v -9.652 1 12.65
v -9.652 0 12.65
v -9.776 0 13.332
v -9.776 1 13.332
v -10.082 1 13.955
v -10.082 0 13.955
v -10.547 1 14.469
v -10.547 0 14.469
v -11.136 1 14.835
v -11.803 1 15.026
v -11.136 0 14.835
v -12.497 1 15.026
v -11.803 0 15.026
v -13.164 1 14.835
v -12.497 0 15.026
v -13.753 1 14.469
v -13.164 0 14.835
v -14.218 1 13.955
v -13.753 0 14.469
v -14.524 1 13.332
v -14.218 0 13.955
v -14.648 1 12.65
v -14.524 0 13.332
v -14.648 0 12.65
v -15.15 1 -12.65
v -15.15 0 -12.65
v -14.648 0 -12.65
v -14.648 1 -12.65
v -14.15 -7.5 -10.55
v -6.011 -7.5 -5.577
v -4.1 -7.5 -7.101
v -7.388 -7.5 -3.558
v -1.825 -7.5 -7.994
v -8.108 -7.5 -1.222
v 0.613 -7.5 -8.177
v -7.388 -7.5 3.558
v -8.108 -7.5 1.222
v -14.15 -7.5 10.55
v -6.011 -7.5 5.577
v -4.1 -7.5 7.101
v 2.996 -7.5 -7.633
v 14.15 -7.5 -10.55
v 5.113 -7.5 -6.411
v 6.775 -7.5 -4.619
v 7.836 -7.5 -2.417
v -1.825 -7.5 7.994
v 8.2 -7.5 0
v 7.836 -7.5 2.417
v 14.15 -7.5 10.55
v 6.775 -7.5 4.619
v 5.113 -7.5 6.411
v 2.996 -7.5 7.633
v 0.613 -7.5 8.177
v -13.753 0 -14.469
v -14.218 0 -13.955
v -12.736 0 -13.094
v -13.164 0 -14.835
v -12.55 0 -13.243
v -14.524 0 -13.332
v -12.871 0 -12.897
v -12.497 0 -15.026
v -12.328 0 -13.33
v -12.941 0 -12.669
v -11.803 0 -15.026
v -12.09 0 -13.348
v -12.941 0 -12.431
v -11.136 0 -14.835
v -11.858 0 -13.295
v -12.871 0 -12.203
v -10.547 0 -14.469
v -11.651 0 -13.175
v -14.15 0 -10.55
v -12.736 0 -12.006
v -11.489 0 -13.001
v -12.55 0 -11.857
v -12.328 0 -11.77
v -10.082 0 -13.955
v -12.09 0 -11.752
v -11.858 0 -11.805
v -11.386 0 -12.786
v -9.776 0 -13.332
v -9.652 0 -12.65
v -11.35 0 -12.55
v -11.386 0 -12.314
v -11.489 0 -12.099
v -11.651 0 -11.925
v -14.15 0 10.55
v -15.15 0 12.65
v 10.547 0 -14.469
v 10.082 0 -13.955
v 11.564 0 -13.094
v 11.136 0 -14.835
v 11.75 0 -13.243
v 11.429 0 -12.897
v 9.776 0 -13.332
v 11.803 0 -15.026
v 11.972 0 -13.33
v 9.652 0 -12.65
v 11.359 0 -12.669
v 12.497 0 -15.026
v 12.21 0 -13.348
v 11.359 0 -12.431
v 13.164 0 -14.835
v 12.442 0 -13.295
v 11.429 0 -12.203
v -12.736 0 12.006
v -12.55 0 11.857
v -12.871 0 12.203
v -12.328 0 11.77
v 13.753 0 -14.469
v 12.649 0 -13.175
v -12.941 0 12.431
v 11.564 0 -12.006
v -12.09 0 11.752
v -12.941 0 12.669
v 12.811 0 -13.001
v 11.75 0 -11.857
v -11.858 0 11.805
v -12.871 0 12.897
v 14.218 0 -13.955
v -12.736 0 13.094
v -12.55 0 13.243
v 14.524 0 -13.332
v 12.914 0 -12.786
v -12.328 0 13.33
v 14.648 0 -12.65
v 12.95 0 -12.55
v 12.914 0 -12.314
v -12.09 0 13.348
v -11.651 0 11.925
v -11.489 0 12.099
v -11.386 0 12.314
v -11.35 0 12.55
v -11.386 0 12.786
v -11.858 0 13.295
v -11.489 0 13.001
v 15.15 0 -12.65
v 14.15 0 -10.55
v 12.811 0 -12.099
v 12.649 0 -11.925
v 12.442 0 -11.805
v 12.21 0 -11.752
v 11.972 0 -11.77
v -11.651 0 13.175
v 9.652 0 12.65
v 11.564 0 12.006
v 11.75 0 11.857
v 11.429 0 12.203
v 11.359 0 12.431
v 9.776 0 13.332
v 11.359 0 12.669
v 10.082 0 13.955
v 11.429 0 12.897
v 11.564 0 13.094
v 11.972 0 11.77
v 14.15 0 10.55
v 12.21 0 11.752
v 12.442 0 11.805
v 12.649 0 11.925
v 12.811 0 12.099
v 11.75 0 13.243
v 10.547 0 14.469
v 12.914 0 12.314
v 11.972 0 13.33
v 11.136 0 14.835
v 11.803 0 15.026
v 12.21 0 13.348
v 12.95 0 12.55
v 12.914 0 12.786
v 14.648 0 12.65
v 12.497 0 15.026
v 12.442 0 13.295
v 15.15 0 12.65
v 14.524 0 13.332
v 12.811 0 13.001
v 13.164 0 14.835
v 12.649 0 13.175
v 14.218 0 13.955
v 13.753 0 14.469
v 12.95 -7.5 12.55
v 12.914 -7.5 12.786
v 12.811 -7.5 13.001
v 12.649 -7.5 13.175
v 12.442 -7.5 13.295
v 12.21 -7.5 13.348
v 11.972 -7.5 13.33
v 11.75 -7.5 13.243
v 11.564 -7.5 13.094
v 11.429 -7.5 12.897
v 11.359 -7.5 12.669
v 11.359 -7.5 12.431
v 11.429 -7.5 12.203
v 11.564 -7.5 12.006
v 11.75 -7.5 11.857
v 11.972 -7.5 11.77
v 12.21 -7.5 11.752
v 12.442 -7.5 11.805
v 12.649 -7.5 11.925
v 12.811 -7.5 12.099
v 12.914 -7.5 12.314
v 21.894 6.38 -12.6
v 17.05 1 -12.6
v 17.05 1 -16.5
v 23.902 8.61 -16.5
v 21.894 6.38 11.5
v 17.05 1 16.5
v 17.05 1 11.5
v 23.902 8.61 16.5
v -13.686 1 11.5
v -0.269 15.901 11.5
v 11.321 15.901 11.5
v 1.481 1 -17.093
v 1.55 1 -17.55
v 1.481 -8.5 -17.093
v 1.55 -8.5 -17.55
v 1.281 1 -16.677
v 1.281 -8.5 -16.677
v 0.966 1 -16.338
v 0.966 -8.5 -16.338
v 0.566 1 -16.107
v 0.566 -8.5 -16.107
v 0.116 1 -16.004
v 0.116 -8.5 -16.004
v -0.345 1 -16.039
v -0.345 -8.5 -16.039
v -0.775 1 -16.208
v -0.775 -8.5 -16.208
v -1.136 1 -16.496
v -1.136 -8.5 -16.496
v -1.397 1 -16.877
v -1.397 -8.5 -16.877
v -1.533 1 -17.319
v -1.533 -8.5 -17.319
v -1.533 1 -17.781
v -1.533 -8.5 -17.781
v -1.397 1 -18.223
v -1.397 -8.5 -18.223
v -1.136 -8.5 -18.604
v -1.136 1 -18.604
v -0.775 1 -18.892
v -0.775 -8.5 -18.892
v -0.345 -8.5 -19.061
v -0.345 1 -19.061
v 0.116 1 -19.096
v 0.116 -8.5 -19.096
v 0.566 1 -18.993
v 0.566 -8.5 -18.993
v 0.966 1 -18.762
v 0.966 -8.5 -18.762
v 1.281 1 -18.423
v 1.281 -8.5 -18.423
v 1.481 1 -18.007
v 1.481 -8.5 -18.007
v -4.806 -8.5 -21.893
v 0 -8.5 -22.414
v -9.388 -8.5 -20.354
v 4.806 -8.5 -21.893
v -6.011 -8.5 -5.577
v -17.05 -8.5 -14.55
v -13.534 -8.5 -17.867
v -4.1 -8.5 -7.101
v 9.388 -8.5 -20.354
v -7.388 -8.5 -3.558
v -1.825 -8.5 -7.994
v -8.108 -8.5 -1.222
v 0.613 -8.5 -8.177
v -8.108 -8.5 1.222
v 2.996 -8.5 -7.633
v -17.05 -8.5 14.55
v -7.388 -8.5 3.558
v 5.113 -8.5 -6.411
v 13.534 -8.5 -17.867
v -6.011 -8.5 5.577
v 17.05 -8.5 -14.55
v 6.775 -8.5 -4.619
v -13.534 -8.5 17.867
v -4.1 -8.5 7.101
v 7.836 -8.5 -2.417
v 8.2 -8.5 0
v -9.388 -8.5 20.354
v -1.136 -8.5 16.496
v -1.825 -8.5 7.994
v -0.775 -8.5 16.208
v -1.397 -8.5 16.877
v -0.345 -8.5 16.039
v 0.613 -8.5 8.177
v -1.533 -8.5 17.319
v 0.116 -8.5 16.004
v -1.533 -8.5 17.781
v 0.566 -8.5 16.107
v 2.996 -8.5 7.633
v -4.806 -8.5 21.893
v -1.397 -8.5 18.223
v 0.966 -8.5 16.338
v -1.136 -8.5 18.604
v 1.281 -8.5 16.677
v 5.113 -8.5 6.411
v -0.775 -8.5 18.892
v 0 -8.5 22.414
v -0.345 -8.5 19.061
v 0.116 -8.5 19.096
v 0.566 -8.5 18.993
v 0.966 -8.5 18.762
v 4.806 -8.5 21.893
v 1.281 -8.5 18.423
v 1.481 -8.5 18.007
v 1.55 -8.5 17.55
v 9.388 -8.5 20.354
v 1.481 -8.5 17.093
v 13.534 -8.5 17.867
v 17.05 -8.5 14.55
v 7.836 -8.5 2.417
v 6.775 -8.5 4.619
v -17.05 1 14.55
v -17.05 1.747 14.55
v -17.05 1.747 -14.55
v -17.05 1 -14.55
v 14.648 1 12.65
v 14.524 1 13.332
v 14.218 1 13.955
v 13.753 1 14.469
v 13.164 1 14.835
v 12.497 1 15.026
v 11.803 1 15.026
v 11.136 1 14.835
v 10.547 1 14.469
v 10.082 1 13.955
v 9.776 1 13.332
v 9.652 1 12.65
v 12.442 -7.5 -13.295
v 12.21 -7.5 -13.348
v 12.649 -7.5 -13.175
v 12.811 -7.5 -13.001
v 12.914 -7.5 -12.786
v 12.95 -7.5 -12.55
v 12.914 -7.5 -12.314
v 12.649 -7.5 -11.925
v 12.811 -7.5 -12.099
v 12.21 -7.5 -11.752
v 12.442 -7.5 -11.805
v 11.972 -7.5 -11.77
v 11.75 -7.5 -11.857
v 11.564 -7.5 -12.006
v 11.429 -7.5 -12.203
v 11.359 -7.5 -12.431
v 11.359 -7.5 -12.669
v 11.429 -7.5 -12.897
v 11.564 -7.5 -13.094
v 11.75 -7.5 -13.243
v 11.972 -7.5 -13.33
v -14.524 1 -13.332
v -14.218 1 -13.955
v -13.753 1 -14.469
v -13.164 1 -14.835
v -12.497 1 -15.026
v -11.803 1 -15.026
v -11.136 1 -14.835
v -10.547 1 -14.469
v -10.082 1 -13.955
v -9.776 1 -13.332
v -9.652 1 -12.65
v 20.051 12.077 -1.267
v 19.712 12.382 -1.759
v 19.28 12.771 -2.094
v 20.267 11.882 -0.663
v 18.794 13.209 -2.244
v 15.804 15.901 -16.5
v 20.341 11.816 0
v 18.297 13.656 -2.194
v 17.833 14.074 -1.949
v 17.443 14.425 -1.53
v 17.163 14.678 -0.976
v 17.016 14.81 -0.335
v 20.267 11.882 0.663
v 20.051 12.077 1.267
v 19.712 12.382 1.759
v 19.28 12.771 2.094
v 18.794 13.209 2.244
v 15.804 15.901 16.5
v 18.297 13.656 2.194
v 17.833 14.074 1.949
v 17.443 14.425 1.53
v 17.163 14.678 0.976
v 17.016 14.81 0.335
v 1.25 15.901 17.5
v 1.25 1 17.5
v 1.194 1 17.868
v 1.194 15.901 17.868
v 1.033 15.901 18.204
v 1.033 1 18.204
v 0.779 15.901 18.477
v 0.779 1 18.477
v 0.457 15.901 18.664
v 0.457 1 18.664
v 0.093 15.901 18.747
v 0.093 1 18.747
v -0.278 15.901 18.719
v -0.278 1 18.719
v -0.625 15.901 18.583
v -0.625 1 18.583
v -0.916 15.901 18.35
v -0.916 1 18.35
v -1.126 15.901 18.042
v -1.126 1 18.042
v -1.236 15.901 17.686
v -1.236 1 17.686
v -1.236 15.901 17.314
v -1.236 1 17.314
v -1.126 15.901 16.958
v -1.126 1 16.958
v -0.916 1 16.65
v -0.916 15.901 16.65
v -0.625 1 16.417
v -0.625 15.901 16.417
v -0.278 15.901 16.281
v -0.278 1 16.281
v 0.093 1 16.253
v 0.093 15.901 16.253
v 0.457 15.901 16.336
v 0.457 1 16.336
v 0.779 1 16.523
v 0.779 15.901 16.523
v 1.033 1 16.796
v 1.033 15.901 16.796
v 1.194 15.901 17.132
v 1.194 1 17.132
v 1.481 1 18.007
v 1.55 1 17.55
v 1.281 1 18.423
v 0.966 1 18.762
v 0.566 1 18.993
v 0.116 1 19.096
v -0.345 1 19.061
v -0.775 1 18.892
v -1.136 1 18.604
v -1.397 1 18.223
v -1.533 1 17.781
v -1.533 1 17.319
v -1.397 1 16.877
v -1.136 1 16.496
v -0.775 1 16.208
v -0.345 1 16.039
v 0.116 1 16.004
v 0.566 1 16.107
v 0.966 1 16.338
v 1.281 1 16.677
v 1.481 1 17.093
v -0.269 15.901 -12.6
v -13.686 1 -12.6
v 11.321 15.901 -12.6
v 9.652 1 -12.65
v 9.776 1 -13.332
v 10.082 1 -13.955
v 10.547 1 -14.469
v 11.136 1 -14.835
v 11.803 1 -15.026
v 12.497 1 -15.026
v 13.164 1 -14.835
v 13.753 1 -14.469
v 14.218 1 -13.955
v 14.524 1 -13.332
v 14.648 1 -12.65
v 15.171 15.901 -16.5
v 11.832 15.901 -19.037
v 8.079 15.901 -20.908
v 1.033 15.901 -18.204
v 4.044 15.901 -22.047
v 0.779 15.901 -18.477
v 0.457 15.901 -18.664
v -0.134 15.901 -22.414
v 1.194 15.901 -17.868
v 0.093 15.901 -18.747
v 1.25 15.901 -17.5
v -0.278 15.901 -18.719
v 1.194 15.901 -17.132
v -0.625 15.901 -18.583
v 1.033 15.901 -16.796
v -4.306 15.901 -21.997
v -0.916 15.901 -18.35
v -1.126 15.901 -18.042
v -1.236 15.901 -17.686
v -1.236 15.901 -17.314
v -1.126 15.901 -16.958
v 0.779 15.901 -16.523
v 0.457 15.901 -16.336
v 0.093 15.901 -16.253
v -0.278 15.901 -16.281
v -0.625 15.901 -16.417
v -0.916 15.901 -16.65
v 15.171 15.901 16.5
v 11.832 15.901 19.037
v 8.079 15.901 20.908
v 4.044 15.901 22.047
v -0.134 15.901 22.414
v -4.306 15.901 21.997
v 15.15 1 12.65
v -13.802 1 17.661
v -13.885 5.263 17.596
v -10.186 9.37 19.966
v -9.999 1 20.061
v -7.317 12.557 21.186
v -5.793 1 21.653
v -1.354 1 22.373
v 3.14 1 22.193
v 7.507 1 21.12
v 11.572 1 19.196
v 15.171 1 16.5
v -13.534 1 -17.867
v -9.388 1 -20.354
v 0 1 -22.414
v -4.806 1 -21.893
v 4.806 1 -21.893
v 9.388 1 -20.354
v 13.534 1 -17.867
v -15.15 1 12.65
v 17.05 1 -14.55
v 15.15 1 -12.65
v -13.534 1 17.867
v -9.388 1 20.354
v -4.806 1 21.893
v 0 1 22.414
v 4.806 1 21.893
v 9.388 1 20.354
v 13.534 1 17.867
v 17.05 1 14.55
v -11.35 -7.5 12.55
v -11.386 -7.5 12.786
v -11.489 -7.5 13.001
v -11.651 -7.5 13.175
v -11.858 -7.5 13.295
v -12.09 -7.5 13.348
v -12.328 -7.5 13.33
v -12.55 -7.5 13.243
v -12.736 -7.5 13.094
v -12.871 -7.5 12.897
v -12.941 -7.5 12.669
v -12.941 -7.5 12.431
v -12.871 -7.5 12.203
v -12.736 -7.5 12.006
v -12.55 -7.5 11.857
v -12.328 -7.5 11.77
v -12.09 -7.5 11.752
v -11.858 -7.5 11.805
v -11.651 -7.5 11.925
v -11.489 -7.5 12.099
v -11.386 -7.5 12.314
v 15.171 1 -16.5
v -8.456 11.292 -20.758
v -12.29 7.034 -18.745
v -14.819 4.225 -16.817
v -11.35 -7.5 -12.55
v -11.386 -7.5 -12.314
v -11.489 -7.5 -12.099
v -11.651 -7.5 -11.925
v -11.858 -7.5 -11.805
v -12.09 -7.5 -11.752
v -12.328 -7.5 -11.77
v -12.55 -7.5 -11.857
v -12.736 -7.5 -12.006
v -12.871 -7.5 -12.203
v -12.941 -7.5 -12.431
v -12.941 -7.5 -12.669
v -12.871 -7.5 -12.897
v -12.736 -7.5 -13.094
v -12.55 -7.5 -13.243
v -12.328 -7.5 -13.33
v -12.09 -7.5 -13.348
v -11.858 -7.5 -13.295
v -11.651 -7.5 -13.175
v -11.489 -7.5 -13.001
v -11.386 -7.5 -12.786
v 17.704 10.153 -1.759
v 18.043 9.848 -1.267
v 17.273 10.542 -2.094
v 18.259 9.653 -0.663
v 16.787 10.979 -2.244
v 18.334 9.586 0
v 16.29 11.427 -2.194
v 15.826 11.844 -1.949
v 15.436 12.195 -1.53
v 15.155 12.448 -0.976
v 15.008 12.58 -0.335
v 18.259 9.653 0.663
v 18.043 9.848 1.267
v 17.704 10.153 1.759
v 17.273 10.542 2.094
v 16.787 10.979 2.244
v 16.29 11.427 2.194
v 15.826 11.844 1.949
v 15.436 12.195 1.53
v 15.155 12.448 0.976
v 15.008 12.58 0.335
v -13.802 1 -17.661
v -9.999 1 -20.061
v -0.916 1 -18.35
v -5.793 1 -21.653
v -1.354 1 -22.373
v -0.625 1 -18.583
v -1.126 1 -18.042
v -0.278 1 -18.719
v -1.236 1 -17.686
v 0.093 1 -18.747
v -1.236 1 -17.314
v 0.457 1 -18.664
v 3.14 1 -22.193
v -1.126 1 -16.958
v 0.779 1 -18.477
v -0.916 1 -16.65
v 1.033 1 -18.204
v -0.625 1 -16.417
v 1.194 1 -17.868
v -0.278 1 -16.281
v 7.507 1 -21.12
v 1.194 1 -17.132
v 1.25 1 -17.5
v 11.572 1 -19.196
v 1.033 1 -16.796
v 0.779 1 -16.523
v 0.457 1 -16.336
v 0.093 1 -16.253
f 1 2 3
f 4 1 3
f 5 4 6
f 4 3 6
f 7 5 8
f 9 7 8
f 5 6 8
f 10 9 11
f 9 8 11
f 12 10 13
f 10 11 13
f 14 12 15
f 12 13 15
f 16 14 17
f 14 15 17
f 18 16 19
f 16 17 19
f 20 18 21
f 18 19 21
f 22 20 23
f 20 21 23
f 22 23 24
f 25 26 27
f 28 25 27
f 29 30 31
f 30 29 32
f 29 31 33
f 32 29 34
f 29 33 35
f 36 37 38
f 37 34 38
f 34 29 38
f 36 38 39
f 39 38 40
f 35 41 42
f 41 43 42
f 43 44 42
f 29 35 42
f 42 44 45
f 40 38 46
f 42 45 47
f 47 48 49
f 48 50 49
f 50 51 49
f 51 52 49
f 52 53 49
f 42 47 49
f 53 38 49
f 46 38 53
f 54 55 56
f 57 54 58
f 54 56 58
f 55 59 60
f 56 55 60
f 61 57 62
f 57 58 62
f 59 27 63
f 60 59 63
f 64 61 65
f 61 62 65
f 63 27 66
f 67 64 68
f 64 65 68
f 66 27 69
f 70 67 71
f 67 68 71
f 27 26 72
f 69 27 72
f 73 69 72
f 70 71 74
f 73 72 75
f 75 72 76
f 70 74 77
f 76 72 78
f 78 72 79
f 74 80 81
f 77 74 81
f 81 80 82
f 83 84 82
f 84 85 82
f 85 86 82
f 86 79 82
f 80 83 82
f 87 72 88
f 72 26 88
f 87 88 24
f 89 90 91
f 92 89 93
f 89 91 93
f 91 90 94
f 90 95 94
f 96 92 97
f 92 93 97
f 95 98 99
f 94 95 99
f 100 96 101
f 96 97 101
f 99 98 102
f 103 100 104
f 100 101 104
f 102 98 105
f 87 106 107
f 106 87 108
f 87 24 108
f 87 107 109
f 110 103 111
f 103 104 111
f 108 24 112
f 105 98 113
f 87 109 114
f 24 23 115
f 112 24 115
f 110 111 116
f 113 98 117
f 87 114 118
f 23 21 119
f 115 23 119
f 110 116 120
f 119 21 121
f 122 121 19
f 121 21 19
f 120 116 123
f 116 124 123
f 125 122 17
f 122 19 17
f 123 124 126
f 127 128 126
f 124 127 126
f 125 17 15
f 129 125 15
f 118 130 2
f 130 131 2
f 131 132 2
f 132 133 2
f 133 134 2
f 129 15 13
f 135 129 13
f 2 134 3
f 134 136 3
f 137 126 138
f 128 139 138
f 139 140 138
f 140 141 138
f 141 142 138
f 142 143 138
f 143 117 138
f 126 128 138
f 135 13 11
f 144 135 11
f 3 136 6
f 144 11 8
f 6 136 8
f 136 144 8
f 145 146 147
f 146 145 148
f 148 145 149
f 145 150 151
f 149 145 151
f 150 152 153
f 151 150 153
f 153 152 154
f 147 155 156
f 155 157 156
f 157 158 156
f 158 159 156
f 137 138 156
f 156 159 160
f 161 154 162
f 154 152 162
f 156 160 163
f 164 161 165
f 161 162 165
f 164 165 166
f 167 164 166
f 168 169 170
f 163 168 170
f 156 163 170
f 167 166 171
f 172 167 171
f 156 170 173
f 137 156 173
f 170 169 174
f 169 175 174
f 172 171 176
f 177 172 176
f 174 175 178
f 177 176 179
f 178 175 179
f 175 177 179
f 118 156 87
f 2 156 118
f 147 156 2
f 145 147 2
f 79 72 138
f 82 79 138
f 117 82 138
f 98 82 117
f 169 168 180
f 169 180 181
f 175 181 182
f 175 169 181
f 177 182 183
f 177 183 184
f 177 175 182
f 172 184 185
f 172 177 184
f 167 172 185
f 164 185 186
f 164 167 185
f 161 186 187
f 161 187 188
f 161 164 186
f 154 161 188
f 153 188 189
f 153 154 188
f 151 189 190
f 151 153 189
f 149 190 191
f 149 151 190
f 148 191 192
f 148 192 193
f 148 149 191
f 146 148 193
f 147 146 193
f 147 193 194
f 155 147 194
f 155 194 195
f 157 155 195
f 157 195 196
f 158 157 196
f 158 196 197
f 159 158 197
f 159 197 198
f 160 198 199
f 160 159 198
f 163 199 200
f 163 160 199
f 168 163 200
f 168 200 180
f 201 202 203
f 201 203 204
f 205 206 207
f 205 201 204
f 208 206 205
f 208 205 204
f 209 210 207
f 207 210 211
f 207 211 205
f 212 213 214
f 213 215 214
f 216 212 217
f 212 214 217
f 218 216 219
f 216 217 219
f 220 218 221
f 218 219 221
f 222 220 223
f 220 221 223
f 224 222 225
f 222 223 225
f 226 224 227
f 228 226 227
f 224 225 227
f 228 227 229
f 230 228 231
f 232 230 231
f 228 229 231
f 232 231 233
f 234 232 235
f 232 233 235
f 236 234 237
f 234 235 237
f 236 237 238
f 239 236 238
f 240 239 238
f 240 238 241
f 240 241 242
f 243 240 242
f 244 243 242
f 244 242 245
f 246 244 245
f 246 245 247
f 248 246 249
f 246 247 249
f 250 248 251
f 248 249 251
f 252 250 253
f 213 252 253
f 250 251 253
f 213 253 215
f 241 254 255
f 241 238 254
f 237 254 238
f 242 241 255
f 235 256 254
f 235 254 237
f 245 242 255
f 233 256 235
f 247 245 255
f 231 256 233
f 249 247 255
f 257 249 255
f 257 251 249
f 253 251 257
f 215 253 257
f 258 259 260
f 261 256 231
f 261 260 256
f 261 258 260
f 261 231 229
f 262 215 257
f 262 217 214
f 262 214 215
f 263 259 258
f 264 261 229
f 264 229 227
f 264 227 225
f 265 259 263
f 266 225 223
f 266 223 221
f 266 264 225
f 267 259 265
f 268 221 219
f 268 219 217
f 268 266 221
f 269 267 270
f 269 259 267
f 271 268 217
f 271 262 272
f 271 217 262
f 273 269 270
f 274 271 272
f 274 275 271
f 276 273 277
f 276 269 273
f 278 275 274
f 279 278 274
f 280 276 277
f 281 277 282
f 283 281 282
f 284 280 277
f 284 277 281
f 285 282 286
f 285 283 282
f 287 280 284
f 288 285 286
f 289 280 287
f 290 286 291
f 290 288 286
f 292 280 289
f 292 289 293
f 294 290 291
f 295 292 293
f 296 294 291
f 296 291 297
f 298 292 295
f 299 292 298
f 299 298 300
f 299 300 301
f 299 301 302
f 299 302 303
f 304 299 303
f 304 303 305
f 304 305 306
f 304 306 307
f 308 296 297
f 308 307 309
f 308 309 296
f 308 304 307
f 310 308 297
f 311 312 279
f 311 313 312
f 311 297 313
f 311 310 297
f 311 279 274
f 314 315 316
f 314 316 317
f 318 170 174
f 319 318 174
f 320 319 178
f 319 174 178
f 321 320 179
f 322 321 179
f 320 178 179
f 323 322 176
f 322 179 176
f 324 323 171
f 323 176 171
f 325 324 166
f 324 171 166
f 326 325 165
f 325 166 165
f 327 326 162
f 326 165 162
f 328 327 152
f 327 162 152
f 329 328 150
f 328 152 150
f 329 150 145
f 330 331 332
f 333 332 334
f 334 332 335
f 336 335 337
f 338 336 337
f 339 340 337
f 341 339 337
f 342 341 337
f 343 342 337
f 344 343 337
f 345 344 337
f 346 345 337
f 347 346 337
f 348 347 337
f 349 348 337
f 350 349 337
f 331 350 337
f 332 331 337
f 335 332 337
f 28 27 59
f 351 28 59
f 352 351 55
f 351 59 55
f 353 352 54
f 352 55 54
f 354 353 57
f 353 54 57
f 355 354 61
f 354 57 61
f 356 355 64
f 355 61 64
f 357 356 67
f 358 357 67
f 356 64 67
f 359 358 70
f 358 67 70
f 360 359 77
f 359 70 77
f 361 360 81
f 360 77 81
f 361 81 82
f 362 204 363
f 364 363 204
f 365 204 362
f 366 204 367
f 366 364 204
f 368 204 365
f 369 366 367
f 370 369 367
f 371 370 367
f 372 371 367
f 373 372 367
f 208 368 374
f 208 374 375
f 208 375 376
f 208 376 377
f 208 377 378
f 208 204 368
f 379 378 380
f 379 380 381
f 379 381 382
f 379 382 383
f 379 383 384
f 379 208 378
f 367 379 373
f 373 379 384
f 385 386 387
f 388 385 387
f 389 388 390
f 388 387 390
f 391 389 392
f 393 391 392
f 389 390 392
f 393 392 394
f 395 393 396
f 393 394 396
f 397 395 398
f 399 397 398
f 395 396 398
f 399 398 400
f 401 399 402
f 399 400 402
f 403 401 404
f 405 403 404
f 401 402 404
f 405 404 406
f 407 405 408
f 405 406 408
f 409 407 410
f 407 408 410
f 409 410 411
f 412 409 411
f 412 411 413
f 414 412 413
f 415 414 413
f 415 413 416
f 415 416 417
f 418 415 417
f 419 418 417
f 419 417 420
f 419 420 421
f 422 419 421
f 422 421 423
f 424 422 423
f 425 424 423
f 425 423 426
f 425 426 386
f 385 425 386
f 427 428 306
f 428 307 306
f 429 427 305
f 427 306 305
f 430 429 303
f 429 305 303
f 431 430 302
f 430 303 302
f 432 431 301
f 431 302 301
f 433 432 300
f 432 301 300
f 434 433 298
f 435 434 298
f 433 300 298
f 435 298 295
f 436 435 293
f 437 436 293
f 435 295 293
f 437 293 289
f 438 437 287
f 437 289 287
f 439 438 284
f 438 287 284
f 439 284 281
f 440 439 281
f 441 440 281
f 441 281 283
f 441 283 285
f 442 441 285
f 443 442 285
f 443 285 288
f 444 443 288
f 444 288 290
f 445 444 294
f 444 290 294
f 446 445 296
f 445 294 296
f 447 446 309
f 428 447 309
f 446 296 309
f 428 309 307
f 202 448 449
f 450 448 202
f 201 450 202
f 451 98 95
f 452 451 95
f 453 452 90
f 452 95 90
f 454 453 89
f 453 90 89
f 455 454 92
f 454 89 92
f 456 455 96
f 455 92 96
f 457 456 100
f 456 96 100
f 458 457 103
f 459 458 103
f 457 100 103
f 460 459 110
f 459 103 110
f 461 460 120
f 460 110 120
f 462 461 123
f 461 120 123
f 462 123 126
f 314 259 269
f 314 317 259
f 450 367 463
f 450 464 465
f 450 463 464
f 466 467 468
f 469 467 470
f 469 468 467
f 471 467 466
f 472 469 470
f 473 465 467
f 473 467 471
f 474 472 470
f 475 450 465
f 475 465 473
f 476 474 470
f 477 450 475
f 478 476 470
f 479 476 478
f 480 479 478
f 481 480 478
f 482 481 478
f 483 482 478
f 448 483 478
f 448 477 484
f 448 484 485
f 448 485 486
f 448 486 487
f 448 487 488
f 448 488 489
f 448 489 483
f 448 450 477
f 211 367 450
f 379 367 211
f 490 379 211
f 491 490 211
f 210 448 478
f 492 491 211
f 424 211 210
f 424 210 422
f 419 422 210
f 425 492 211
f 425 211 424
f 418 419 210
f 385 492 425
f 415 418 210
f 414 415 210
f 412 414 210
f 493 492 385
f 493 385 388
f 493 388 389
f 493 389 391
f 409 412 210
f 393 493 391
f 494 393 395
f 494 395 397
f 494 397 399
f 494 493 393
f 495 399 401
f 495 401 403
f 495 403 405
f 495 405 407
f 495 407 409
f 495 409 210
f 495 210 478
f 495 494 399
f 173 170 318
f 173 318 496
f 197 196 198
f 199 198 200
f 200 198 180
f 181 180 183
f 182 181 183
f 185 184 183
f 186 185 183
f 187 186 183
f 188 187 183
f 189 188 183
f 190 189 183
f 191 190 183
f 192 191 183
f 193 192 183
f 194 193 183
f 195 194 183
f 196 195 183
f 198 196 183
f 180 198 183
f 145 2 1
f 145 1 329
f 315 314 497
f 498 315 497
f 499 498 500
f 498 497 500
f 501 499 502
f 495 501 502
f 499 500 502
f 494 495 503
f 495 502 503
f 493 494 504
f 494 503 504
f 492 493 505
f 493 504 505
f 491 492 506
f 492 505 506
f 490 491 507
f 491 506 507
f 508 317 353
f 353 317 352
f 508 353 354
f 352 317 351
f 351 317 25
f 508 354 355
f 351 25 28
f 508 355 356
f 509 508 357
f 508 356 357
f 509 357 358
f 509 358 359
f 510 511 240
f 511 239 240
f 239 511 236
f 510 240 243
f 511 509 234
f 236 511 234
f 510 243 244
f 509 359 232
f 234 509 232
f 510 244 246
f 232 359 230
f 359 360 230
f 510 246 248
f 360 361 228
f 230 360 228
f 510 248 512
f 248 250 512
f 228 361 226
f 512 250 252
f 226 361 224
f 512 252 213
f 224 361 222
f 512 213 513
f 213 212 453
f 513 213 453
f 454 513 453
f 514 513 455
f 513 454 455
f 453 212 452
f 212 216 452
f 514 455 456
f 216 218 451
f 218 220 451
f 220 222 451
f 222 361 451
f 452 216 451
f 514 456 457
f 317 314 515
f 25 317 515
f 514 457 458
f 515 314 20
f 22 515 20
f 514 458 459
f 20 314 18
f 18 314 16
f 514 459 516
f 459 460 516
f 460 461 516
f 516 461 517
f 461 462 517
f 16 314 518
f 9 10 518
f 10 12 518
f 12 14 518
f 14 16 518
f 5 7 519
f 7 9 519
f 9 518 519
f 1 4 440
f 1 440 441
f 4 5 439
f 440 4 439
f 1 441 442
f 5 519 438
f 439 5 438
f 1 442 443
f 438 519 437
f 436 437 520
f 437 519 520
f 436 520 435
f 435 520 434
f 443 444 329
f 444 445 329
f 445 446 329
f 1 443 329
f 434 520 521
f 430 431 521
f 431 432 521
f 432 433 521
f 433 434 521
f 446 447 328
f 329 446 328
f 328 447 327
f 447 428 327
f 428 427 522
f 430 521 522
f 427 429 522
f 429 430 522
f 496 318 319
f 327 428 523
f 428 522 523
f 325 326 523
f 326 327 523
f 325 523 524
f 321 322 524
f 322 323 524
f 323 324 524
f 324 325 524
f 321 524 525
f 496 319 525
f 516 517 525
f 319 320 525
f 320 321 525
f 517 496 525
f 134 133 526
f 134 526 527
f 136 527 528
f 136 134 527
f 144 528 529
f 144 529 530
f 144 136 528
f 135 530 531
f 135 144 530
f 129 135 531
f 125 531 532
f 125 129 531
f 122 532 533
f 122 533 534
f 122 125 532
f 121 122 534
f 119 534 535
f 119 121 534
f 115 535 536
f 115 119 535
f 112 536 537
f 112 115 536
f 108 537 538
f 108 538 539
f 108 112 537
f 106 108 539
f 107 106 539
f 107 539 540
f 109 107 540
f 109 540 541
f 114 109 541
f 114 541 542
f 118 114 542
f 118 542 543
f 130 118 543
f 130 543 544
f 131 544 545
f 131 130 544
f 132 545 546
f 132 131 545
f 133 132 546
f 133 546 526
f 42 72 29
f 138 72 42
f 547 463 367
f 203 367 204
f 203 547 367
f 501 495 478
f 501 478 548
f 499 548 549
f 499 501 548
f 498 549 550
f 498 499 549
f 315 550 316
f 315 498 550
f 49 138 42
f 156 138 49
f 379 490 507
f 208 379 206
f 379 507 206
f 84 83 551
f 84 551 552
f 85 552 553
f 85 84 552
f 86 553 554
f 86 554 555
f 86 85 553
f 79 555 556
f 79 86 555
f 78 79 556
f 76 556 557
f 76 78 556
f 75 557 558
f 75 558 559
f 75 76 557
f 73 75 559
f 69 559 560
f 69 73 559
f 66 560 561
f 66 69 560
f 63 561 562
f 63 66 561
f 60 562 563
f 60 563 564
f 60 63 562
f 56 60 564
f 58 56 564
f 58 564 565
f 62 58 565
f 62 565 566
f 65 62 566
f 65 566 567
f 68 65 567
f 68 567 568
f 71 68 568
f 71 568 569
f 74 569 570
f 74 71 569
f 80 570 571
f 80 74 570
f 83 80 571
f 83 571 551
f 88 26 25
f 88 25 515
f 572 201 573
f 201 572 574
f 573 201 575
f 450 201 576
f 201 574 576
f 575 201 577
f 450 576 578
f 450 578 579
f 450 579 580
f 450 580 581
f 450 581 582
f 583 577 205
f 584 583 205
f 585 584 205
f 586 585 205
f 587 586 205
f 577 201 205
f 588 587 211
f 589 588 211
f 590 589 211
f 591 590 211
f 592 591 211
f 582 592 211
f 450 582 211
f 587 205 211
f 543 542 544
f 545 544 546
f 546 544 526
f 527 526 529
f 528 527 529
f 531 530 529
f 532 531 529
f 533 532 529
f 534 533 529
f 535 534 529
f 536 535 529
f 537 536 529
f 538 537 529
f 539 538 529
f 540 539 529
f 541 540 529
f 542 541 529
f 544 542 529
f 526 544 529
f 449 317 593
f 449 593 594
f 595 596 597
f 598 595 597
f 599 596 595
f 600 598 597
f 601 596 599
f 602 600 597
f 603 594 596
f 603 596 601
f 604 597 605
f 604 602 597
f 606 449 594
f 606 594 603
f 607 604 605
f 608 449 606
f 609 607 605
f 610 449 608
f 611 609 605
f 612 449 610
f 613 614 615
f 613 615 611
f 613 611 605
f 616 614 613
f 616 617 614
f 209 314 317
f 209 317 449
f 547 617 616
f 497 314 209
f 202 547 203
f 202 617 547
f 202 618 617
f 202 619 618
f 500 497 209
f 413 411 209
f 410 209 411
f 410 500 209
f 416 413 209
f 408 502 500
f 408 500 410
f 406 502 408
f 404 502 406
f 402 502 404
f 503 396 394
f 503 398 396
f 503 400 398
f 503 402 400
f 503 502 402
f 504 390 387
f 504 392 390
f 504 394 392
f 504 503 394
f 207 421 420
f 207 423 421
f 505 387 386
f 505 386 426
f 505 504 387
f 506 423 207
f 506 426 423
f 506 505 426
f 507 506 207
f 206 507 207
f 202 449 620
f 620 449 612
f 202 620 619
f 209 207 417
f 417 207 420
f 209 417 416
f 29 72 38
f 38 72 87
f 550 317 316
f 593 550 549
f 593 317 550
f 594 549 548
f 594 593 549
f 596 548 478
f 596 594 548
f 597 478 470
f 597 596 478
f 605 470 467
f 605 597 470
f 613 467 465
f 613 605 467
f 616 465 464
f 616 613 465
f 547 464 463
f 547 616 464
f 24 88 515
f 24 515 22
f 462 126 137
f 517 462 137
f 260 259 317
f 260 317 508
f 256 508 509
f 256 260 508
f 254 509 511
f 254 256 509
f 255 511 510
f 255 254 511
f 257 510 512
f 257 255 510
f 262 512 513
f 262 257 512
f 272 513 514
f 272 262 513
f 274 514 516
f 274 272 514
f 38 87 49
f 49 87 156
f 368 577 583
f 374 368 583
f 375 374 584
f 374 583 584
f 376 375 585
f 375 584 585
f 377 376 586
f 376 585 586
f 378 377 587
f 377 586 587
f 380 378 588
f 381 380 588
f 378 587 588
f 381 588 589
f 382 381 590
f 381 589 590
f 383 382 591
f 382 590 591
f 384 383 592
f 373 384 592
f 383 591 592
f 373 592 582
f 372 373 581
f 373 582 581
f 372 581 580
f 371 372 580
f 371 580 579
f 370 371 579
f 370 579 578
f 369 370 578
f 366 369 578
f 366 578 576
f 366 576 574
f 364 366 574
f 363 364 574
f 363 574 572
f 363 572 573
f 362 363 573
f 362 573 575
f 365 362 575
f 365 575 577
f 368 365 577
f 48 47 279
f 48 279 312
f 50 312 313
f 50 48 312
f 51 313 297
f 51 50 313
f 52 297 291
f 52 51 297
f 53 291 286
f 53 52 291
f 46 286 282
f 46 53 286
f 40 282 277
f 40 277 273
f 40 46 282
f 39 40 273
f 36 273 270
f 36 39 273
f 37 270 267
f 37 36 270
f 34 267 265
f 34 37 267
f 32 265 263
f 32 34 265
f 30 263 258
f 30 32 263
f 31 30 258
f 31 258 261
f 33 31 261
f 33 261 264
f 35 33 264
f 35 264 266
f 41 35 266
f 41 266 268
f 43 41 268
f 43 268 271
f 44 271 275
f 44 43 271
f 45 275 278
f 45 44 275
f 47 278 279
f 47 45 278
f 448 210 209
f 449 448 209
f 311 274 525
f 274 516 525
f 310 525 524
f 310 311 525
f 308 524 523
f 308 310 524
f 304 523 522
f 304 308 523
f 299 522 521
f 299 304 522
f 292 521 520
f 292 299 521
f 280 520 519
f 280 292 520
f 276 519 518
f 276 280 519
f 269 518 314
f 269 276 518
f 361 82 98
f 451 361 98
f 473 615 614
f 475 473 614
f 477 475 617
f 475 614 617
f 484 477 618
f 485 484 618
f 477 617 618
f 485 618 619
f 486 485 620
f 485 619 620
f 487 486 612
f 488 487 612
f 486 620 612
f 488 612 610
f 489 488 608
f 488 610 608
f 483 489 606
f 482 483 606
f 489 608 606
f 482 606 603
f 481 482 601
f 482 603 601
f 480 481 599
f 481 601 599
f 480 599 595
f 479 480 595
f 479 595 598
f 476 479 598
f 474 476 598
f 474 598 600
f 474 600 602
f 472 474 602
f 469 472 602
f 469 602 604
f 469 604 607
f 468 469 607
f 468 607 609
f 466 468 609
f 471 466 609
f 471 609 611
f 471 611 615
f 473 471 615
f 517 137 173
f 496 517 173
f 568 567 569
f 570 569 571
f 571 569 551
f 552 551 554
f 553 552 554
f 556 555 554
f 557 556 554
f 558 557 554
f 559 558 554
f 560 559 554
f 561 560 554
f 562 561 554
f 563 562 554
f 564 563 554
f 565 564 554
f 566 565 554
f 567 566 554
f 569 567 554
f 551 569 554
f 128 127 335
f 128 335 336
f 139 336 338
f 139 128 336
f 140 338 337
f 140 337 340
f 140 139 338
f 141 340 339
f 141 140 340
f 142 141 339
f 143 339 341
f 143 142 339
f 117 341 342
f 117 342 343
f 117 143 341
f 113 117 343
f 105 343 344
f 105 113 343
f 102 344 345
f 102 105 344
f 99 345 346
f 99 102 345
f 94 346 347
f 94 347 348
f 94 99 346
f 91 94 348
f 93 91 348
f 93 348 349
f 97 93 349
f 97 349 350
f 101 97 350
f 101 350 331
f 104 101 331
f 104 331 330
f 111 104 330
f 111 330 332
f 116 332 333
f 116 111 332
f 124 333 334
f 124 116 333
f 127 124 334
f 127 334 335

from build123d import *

# Parameters (mm, degrees)
F2_W           = 34.1
F2_H           = 29.1
F2_W_2         = 30.3
F2_H_2         = 25.3
F3_DEPTH       = 7.5
F3_DEPTH_BACK  = 1
F4_W           = 34.1
F4_H           = 29.1
F4_R           = 8.2
F5_DEPTH       = 1
F6_W           = 30.3
F6_H           = 25.3
F6_W_2         = 28.3
F6_H_2         = 21.1
F7_DEPTH       = 7.5
F9_DEPTH       = 8.5
F9_DEPTH_BACK  = 1
F10_R          = 1.55
F11_DEPTH      = 1.001
F11_DEPTH_BACK = 8.501
F12_R          = 2.5
F13_DEPTH      = 25
F14_R          = 0.8
F15_DEPTH      = 7.5
F18_DEPTH      = 22.5
F20_DEPTH      = 12.6
F20_DEPTH_BACK = 11.5
F21_R          = 2.25
F22_DEPTH      = 8.4193905153
F23_R          = 1.25
F24_DEPTH      = 15.9017858469
F26_DEPTH      = 15.9017858469


# Not quite as in the source:
# - a pattern or mirror of a feature is missing from the dataset's text; its kind, count and spacing are read off the source's solid


with BuildPart() as f3:
    # F2 (on Front) → F3 (new body, two sides)
    with BuildSketch(Plane.XZ) as f3_sk:
        Rectangle(F2_W, F2_H)
        Rectangle(F2_W_2, F2_H_2, mode=Mode.SUBTRACT)
    extrude(amount=F3_DEPTH)
    extrude(f3_sk.sketch, amount=-F3_DEPTH_BACK)

    # F4 (on face) → F5 (join)
    with BuildSketch(Plane.XZ.offset(7.5)):
        Rectangle(F4_W, F4_H)
        Circle(F4_R, mode=Mode.SUBTRACT)
    extrude(amount=F5_DEPTH)

    # F6 (on Front) → F7 (join, through all)
    with BuildSketch(Plane.XZ):
        Rectangle(F6_W, F6_H)
        Rectangle(F6_W_2, F6_H_2, mode=Mode.SUBTRACT)
    extrude(amount=F7_DEPTH)

    # F8 (on Front) → F9 (join, two sides)
    with BuildSketch(Plane.XZ) as f9_sk:
        with BuildLine():
            ThreePointArc((17.05, 14.55), (0, 22.4143926976), (-17.05, 14.55))
            Line((-17.05, 14.55), (17.05, 14.55))
        make_face()
        with BuildLine():
            ThreePointArc((-17.05, -14.55), (0, -22.4143926976), (17.05, -14.55))
            Line((17.05, -14.55), (-17.05, -14.55))
        make_face()
    extrude(amount=F9_DEPTH)
    extrude(f9_sk.sketch, amount=-F9_DEPTH_BACK)

    # F10 (on Front) → F11 (cut, two sides)
    with BuildSketch(Plane.XZ) as f11_sk:
        with Locations((0, 17.55)):
            Circle(F10_R)
        with Locations((0, -17.55)):
            Circle(F10_R)
    extrude(amount=-F11_DEPTH, mode=Mode.SUBTRACT)
    extrude(f11_sk.sketch, amount=F11_DEPTH_BACK, mode=Mode.SUBTRACT)

    # F12 (on face) → F13 (cut)
    with BuildSketch(Plane.XZ):
        with Locations((12.15, 12.55)):
            Circle(F12_R)
        with Locations((-12.15, 12.55)):
            Circle(F12_R)
        with Locations((-12.15, -12.55)):
            Circle(F12_R)
        with Locations((12.15, -12.55)):
            Circle(F12_R)
    extrude(amount=-F13_DEPTH, mode=Mode.SUBTRACT)

    # F14 (on Front) → F15 (cut, through all)
    with BuildSketch(Plane.XZ):
        with Locations((12.15, 12.55)):
            Circle(F14_R)
        with Locations((-12.15, 12.55)):
            Circle(F14_R)
        with Locations((-12.15, -12.55)):
            Circle(F14_R)
        with Locations((12.15, -12.55)):
            Circle(F14_R)
    extrude(amount=F15_DEPTH, mode=Mode.SUBTRACT)


with BuildPart() as f18:
    # F17 (on Top) → F18 (new body, symmetric)
    with BuildSketch(Plane.XY):
        Polygon((15.8040770662, 15.9007858469), (-4.3060885251, 15.9007858469), (-17.05, 1.7472382749), (-17.05, 1), (17.05, 1), (23.9017346294, 8.6096222277), align=None)
    extrude(amount=F18_DEPTH, both=True)

    # F19 (on Top) → F20 (cut, two sides)
    with BuildSketch(Plane.XY) as f20_sk:
        Polygon((-14.5863222203, 0), (28.9802591738, 0), (11.3206474166, 15.9007858469), (-0.2691903362, 15.9007858469), align=None)
        Polygon((-14.8685498887, -0.3134455806), (-14.5863222203, 0), (-15.2166664732, 0), align=None)
    extrude(amount=-F20_DEPTH, mode=Mode.SUBTRACT)
    extrude(f20_sk.sketch, amount=F20_DEPTH_BACK, mode=Mode.SUBTRACT)

    # F21 (on face) → F22 (cut, through all)
    with BuildSketch(Plane(origin=(12.9754986086, 14.4107511409, 0), x_dir=(0.7431448255, -0.6691306064, 0), z_dir=(-0.6691306064, -0.7431448255, 0))):
        with Locations((4.9602501193, 0)):
            Circle(F21_R)
    extrude(amount=-F22_DEPTH, mode=Mode.SUBTRACT)

    # F23 (on Front) → F24 (cut, through all)
    with BuildSketch(Plane.XZ):
        with Locations((0, 17.5)):
            Circle(F23_R)
        with Locations((0, -17.5)):
            Circle(F23_R)
    extrude(amount=-F24_DEPTH, mode=Mode.SUBTRACT)

    # F25 (on Front) → F26 (cut, through all)
    with BuildSketch(Plane.XZ):
        with BuildLine():
            Line((-20.9939805572, 29.1438214481), (-20.9939805572, 7.8522468355))
            ThreePointArc((-20.9939805572, 7.8522468355), (-5.2127815316, 21.799814419), (15.1708602261, 16.5))
            Line((15.1708602261, 16.5), (34.9690280855, 16.5))
            Line((34.9690280855, 16.5), (34.9690280855, 29.1438214481))
            Line((34.9690280855, 29.1438214481), (-20.9939805572, 29.1438214481))
        make_face()
    f26 = extrude(amount=-F26_DEPTH, mode=Mode.SUBTRACT)

    # F26_copies: F26 across plane
    add(f26.mirror(Plane(origin=(0, 0, 0), x_dir=(-1, 0, 0), z_dir=(0, 0, -1))), mode=Mode.SUBTRACT)


solid = Compound([f3.part, f18.part])
